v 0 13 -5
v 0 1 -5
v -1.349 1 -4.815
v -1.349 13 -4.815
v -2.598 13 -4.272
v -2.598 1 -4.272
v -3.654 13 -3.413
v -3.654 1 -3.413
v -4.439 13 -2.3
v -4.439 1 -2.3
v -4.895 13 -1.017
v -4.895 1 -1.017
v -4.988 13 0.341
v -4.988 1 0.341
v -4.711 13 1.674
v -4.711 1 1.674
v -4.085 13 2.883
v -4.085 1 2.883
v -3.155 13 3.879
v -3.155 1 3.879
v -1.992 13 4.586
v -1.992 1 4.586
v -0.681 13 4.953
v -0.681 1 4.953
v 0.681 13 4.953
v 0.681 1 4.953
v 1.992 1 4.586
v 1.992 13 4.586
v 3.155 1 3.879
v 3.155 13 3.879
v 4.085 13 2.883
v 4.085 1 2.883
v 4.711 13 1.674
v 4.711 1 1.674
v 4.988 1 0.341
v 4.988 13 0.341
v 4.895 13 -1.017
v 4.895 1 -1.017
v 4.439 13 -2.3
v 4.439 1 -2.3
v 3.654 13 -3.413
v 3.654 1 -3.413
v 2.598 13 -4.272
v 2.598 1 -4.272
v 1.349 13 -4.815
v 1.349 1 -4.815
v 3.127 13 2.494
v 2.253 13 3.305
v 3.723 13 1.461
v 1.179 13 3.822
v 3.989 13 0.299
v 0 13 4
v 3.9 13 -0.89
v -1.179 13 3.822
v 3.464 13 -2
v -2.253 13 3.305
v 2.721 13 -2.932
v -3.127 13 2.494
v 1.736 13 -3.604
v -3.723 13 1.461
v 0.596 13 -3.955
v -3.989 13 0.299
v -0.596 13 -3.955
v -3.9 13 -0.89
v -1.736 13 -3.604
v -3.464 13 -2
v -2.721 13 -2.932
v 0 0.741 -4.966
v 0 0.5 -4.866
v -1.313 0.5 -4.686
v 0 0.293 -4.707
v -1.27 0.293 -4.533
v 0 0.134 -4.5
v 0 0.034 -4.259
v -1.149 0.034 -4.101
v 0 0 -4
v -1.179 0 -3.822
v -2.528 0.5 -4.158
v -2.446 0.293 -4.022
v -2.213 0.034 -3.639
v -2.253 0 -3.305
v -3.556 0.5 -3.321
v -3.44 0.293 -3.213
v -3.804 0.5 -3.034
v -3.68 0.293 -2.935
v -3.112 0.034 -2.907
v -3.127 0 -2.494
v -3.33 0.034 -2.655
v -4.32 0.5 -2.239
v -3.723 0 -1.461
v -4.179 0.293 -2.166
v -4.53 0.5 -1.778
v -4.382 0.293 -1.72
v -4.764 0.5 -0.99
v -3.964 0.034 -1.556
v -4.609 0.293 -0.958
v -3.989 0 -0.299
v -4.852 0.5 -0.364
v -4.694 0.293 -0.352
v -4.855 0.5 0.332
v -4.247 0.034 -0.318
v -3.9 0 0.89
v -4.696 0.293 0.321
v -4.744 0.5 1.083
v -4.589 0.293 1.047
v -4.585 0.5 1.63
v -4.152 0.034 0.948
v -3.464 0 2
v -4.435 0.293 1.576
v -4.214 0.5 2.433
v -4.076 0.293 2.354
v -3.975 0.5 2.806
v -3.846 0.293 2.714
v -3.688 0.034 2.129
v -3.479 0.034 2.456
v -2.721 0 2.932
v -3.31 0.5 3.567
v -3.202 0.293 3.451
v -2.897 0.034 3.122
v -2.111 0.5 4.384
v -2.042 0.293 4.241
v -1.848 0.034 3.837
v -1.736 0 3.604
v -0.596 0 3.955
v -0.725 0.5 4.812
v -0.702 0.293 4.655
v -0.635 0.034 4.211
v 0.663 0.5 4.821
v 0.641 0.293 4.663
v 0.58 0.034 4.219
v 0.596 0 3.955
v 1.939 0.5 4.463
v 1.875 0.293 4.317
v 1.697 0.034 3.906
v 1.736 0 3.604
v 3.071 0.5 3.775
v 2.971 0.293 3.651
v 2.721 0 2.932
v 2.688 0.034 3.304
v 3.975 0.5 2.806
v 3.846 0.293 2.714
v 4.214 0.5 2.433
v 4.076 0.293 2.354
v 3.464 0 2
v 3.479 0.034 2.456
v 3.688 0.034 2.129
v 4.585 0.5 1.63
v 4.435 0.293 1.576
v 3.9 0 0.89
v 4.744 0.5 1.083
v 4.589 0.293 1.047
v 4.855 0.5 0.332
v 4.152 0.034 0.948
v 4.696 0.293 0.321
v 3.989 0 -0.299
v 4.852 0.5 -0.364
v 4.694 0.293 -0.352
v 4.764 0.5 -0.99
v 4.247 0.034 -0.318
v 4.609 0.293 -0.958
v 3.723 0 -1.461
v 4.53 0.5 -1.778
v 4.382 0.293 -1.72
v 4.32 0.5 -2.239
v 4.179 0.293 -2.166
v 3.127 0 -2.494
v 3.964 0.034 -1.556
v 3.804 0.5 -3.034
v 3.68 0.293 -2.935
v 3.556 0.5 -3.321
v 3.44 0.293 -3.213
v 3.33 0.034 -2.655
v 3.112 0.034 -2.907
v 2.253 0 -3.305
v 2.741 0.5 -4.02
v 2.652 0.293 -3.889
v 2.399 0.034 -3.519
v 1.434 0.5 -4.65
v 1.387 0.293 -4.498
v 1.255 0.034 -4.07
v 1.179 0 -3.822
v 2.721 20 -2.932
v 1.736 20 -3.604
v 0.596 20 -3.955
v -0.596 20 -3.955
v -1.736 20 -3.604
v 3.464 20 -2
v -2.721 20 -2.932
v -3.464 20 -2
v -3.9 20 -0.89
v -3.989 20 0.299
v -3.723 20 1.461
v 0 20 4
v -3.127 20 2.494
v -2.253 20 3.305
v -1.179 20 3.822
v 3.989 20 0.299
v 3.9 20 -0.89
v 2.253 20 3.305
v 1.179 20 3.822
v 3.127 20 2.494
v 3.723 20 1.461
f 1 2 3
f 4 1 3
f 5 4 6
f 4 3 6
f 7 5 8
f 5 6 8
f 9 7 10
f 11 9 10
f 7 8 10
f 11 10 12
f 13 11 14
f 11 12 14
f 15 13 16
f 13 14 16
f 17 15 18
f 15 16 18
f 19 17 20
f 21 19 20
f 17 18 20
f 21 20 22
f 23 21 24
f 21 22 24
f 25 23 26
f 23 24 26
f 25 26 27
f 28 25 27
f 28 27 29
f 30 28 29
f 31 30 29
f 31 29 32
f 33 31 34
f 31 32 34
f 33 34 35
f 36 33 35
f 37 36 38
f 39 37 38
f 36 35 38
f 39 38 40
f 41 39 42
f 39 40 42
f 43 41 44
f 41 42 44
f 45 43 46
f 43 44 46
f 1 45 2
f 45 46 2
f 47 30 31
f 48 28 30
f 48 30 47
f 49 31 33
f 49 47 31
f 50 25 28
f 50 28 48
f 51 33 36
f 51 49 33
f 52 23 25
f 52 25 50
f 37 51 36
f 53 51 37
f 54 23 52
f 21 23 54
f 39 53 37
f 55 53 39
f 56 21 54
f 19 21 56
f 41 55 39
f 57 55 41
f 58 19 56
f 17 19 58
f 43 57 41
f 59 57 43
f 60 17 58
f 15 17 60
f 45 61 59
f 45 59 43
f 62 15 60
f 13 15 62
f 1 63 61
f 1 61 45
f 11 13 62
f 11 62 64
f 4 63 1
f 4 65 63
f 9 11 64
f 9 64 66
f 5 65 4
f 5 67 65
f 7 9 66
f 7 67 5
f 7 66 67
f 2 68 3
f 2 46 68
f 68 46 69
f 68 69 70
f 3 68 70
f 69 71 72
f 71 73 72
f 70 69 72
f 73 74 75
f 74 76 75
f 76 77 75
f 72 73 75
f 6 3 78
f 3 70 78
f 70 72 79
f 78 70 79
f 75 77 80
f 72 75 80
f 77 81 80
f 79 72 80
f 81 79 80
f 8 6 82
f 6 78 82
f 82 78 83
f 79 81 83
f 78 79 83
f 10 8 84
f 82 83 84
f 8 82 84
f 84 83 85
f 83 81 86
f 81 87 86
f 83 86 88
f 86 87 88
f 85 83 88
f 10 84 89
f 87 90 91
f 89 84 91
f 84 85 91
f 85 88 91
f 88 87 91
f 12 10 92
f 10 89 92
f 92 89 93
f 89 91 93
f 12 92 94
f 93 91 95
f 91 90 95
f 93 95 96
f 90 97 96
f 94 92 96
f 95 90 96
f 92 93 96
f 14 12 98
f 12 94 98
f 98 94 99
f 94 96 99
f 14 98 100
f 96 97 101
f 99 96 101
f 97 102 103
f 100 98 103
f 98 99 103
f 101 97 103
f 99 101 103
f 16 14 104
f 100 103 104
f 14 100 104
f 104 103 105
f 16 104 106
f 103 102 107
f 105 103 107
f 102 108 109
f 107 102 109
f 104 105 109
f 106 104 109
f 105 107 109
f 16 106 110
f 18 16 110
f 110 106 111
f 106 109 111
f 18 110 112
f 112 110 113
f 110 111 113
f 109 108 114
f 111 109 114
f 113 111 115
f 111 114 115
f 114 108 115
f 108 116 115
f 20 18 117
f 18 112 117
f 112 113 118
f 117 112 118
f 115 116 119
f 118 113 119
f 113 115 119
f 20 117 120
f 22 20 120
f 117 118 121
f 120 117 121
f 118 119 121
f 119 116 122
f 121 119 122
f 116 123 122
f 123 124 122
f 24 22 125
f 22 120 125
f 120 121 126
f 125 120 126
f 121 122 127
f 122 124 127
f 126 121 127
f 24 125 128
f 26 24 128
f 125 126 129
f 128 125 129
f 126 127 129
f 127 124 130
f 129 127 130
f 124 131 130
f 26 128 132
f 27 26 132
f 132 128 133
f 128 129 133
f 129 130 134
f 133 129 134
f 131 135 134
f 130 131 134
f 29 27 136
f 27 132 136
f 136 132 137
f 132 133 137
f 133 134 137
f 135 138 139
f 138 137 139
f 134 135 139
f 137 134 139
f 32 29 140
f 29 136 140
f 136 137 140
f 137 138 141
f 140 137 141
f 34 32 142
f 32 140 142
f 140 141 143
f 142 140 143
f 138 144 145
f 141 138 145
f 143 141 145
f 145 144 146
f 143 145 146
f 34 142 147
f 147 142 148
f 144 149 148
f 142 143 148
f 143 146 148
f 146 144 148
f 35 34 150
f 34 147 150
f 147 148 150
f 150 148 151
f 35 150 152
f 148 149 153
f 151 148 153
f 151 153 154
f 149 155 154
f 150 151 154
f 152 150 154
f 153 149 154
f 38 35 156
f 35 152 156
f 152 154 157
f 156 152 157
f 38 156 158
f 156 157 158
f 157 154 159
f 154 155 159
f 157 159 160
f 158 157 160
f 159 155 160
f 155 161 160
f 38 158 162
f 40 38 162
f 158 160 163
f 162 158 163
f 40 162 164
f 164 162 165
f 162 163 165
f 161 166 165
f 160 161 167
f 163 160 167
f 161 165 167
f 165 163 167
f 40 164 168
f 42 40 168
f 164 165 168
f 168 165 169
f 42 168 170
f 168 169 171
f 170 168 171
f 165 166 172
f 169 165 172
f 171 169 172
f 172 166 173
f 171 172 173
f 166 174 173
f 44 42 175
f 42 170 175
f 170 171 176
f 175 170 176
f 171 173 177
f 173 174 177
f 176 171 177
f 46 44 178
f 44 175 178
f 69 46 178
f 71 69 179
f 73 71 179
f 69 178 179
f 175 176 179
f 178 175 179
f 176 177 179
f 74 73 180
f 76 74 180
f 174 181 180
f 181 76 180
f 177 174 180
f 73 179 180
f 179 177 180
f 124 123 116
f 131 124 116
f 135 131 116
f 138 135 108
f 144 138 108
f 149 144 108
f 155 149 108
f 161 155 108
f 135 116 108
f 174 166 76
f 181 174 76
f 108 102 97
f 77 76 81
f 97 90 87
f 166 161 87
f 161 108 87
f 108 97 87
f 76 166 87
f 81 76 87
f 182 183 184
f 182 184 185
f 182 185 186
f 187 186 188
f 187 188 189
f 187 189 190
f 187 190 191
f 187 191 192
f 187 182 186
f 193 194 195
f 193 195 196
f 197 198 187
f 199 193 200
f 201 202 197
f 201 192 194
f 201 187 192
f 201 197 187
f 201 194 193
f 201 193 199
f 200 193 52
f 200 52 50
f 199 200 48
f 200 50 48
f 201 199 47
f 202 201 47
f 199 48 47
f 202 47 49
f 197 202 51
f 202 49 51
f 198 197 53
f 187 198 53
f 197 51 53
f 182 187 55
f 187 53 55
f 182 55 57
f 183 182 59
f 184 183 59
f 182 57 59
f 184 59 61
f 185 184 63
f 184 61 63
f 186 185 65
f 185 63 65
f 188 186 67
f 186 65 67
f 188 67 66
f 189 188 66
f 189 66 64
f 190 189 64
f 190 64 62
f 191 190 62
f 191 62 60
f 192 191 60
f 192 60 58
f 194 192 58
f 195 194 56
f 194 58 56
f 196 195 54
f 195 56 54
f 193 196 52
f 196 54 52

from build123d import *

# Parameters (mm, degrees)
SKETCH1_R           = 5
BOSS_EXTRUDE1_DEPTH = 13
FILLET2_R           = 1
SKETCH2_R           = 4
BOSS_EXTRUDE2_DEPTH = 7


with BuildPart() as part:
    # Sketch1 → Boss-Extrude1 (new body)
    with BuildSketch(Plane(origin=(0, 0, 0), x_dir=(1, 0, 0), z_dir=(0, 1, 0))):
        with Locations(Location((0, 0, 0), (0, 0, 90))):
            Circle(SKETCH1_R)
    extrude(amount=BOSS_EXTRUDE1_DEPTH)

    # Fillet2
    fillet2_edges = [part.edges().sort_by_distance(p)[0] for p in [
        (0, 0, 5),
    ]]
    fillet(fillet2_edges, radius=FILLET2_R)

    # Sketch2 → Boss-Extrude2 (add)
    with BuildSketch(Plane(origin=(0, 13, 0), x_dir=(1, 0, 0), z_dir=(0, 1, 0))):
        with Locations(Location((0, 0, 0), (0, 0, 270))):
            Circle(SKETCH2_R)
    extrude(amount=BOSS_EXTRUDE2_DEPTH)


solid = part.part
